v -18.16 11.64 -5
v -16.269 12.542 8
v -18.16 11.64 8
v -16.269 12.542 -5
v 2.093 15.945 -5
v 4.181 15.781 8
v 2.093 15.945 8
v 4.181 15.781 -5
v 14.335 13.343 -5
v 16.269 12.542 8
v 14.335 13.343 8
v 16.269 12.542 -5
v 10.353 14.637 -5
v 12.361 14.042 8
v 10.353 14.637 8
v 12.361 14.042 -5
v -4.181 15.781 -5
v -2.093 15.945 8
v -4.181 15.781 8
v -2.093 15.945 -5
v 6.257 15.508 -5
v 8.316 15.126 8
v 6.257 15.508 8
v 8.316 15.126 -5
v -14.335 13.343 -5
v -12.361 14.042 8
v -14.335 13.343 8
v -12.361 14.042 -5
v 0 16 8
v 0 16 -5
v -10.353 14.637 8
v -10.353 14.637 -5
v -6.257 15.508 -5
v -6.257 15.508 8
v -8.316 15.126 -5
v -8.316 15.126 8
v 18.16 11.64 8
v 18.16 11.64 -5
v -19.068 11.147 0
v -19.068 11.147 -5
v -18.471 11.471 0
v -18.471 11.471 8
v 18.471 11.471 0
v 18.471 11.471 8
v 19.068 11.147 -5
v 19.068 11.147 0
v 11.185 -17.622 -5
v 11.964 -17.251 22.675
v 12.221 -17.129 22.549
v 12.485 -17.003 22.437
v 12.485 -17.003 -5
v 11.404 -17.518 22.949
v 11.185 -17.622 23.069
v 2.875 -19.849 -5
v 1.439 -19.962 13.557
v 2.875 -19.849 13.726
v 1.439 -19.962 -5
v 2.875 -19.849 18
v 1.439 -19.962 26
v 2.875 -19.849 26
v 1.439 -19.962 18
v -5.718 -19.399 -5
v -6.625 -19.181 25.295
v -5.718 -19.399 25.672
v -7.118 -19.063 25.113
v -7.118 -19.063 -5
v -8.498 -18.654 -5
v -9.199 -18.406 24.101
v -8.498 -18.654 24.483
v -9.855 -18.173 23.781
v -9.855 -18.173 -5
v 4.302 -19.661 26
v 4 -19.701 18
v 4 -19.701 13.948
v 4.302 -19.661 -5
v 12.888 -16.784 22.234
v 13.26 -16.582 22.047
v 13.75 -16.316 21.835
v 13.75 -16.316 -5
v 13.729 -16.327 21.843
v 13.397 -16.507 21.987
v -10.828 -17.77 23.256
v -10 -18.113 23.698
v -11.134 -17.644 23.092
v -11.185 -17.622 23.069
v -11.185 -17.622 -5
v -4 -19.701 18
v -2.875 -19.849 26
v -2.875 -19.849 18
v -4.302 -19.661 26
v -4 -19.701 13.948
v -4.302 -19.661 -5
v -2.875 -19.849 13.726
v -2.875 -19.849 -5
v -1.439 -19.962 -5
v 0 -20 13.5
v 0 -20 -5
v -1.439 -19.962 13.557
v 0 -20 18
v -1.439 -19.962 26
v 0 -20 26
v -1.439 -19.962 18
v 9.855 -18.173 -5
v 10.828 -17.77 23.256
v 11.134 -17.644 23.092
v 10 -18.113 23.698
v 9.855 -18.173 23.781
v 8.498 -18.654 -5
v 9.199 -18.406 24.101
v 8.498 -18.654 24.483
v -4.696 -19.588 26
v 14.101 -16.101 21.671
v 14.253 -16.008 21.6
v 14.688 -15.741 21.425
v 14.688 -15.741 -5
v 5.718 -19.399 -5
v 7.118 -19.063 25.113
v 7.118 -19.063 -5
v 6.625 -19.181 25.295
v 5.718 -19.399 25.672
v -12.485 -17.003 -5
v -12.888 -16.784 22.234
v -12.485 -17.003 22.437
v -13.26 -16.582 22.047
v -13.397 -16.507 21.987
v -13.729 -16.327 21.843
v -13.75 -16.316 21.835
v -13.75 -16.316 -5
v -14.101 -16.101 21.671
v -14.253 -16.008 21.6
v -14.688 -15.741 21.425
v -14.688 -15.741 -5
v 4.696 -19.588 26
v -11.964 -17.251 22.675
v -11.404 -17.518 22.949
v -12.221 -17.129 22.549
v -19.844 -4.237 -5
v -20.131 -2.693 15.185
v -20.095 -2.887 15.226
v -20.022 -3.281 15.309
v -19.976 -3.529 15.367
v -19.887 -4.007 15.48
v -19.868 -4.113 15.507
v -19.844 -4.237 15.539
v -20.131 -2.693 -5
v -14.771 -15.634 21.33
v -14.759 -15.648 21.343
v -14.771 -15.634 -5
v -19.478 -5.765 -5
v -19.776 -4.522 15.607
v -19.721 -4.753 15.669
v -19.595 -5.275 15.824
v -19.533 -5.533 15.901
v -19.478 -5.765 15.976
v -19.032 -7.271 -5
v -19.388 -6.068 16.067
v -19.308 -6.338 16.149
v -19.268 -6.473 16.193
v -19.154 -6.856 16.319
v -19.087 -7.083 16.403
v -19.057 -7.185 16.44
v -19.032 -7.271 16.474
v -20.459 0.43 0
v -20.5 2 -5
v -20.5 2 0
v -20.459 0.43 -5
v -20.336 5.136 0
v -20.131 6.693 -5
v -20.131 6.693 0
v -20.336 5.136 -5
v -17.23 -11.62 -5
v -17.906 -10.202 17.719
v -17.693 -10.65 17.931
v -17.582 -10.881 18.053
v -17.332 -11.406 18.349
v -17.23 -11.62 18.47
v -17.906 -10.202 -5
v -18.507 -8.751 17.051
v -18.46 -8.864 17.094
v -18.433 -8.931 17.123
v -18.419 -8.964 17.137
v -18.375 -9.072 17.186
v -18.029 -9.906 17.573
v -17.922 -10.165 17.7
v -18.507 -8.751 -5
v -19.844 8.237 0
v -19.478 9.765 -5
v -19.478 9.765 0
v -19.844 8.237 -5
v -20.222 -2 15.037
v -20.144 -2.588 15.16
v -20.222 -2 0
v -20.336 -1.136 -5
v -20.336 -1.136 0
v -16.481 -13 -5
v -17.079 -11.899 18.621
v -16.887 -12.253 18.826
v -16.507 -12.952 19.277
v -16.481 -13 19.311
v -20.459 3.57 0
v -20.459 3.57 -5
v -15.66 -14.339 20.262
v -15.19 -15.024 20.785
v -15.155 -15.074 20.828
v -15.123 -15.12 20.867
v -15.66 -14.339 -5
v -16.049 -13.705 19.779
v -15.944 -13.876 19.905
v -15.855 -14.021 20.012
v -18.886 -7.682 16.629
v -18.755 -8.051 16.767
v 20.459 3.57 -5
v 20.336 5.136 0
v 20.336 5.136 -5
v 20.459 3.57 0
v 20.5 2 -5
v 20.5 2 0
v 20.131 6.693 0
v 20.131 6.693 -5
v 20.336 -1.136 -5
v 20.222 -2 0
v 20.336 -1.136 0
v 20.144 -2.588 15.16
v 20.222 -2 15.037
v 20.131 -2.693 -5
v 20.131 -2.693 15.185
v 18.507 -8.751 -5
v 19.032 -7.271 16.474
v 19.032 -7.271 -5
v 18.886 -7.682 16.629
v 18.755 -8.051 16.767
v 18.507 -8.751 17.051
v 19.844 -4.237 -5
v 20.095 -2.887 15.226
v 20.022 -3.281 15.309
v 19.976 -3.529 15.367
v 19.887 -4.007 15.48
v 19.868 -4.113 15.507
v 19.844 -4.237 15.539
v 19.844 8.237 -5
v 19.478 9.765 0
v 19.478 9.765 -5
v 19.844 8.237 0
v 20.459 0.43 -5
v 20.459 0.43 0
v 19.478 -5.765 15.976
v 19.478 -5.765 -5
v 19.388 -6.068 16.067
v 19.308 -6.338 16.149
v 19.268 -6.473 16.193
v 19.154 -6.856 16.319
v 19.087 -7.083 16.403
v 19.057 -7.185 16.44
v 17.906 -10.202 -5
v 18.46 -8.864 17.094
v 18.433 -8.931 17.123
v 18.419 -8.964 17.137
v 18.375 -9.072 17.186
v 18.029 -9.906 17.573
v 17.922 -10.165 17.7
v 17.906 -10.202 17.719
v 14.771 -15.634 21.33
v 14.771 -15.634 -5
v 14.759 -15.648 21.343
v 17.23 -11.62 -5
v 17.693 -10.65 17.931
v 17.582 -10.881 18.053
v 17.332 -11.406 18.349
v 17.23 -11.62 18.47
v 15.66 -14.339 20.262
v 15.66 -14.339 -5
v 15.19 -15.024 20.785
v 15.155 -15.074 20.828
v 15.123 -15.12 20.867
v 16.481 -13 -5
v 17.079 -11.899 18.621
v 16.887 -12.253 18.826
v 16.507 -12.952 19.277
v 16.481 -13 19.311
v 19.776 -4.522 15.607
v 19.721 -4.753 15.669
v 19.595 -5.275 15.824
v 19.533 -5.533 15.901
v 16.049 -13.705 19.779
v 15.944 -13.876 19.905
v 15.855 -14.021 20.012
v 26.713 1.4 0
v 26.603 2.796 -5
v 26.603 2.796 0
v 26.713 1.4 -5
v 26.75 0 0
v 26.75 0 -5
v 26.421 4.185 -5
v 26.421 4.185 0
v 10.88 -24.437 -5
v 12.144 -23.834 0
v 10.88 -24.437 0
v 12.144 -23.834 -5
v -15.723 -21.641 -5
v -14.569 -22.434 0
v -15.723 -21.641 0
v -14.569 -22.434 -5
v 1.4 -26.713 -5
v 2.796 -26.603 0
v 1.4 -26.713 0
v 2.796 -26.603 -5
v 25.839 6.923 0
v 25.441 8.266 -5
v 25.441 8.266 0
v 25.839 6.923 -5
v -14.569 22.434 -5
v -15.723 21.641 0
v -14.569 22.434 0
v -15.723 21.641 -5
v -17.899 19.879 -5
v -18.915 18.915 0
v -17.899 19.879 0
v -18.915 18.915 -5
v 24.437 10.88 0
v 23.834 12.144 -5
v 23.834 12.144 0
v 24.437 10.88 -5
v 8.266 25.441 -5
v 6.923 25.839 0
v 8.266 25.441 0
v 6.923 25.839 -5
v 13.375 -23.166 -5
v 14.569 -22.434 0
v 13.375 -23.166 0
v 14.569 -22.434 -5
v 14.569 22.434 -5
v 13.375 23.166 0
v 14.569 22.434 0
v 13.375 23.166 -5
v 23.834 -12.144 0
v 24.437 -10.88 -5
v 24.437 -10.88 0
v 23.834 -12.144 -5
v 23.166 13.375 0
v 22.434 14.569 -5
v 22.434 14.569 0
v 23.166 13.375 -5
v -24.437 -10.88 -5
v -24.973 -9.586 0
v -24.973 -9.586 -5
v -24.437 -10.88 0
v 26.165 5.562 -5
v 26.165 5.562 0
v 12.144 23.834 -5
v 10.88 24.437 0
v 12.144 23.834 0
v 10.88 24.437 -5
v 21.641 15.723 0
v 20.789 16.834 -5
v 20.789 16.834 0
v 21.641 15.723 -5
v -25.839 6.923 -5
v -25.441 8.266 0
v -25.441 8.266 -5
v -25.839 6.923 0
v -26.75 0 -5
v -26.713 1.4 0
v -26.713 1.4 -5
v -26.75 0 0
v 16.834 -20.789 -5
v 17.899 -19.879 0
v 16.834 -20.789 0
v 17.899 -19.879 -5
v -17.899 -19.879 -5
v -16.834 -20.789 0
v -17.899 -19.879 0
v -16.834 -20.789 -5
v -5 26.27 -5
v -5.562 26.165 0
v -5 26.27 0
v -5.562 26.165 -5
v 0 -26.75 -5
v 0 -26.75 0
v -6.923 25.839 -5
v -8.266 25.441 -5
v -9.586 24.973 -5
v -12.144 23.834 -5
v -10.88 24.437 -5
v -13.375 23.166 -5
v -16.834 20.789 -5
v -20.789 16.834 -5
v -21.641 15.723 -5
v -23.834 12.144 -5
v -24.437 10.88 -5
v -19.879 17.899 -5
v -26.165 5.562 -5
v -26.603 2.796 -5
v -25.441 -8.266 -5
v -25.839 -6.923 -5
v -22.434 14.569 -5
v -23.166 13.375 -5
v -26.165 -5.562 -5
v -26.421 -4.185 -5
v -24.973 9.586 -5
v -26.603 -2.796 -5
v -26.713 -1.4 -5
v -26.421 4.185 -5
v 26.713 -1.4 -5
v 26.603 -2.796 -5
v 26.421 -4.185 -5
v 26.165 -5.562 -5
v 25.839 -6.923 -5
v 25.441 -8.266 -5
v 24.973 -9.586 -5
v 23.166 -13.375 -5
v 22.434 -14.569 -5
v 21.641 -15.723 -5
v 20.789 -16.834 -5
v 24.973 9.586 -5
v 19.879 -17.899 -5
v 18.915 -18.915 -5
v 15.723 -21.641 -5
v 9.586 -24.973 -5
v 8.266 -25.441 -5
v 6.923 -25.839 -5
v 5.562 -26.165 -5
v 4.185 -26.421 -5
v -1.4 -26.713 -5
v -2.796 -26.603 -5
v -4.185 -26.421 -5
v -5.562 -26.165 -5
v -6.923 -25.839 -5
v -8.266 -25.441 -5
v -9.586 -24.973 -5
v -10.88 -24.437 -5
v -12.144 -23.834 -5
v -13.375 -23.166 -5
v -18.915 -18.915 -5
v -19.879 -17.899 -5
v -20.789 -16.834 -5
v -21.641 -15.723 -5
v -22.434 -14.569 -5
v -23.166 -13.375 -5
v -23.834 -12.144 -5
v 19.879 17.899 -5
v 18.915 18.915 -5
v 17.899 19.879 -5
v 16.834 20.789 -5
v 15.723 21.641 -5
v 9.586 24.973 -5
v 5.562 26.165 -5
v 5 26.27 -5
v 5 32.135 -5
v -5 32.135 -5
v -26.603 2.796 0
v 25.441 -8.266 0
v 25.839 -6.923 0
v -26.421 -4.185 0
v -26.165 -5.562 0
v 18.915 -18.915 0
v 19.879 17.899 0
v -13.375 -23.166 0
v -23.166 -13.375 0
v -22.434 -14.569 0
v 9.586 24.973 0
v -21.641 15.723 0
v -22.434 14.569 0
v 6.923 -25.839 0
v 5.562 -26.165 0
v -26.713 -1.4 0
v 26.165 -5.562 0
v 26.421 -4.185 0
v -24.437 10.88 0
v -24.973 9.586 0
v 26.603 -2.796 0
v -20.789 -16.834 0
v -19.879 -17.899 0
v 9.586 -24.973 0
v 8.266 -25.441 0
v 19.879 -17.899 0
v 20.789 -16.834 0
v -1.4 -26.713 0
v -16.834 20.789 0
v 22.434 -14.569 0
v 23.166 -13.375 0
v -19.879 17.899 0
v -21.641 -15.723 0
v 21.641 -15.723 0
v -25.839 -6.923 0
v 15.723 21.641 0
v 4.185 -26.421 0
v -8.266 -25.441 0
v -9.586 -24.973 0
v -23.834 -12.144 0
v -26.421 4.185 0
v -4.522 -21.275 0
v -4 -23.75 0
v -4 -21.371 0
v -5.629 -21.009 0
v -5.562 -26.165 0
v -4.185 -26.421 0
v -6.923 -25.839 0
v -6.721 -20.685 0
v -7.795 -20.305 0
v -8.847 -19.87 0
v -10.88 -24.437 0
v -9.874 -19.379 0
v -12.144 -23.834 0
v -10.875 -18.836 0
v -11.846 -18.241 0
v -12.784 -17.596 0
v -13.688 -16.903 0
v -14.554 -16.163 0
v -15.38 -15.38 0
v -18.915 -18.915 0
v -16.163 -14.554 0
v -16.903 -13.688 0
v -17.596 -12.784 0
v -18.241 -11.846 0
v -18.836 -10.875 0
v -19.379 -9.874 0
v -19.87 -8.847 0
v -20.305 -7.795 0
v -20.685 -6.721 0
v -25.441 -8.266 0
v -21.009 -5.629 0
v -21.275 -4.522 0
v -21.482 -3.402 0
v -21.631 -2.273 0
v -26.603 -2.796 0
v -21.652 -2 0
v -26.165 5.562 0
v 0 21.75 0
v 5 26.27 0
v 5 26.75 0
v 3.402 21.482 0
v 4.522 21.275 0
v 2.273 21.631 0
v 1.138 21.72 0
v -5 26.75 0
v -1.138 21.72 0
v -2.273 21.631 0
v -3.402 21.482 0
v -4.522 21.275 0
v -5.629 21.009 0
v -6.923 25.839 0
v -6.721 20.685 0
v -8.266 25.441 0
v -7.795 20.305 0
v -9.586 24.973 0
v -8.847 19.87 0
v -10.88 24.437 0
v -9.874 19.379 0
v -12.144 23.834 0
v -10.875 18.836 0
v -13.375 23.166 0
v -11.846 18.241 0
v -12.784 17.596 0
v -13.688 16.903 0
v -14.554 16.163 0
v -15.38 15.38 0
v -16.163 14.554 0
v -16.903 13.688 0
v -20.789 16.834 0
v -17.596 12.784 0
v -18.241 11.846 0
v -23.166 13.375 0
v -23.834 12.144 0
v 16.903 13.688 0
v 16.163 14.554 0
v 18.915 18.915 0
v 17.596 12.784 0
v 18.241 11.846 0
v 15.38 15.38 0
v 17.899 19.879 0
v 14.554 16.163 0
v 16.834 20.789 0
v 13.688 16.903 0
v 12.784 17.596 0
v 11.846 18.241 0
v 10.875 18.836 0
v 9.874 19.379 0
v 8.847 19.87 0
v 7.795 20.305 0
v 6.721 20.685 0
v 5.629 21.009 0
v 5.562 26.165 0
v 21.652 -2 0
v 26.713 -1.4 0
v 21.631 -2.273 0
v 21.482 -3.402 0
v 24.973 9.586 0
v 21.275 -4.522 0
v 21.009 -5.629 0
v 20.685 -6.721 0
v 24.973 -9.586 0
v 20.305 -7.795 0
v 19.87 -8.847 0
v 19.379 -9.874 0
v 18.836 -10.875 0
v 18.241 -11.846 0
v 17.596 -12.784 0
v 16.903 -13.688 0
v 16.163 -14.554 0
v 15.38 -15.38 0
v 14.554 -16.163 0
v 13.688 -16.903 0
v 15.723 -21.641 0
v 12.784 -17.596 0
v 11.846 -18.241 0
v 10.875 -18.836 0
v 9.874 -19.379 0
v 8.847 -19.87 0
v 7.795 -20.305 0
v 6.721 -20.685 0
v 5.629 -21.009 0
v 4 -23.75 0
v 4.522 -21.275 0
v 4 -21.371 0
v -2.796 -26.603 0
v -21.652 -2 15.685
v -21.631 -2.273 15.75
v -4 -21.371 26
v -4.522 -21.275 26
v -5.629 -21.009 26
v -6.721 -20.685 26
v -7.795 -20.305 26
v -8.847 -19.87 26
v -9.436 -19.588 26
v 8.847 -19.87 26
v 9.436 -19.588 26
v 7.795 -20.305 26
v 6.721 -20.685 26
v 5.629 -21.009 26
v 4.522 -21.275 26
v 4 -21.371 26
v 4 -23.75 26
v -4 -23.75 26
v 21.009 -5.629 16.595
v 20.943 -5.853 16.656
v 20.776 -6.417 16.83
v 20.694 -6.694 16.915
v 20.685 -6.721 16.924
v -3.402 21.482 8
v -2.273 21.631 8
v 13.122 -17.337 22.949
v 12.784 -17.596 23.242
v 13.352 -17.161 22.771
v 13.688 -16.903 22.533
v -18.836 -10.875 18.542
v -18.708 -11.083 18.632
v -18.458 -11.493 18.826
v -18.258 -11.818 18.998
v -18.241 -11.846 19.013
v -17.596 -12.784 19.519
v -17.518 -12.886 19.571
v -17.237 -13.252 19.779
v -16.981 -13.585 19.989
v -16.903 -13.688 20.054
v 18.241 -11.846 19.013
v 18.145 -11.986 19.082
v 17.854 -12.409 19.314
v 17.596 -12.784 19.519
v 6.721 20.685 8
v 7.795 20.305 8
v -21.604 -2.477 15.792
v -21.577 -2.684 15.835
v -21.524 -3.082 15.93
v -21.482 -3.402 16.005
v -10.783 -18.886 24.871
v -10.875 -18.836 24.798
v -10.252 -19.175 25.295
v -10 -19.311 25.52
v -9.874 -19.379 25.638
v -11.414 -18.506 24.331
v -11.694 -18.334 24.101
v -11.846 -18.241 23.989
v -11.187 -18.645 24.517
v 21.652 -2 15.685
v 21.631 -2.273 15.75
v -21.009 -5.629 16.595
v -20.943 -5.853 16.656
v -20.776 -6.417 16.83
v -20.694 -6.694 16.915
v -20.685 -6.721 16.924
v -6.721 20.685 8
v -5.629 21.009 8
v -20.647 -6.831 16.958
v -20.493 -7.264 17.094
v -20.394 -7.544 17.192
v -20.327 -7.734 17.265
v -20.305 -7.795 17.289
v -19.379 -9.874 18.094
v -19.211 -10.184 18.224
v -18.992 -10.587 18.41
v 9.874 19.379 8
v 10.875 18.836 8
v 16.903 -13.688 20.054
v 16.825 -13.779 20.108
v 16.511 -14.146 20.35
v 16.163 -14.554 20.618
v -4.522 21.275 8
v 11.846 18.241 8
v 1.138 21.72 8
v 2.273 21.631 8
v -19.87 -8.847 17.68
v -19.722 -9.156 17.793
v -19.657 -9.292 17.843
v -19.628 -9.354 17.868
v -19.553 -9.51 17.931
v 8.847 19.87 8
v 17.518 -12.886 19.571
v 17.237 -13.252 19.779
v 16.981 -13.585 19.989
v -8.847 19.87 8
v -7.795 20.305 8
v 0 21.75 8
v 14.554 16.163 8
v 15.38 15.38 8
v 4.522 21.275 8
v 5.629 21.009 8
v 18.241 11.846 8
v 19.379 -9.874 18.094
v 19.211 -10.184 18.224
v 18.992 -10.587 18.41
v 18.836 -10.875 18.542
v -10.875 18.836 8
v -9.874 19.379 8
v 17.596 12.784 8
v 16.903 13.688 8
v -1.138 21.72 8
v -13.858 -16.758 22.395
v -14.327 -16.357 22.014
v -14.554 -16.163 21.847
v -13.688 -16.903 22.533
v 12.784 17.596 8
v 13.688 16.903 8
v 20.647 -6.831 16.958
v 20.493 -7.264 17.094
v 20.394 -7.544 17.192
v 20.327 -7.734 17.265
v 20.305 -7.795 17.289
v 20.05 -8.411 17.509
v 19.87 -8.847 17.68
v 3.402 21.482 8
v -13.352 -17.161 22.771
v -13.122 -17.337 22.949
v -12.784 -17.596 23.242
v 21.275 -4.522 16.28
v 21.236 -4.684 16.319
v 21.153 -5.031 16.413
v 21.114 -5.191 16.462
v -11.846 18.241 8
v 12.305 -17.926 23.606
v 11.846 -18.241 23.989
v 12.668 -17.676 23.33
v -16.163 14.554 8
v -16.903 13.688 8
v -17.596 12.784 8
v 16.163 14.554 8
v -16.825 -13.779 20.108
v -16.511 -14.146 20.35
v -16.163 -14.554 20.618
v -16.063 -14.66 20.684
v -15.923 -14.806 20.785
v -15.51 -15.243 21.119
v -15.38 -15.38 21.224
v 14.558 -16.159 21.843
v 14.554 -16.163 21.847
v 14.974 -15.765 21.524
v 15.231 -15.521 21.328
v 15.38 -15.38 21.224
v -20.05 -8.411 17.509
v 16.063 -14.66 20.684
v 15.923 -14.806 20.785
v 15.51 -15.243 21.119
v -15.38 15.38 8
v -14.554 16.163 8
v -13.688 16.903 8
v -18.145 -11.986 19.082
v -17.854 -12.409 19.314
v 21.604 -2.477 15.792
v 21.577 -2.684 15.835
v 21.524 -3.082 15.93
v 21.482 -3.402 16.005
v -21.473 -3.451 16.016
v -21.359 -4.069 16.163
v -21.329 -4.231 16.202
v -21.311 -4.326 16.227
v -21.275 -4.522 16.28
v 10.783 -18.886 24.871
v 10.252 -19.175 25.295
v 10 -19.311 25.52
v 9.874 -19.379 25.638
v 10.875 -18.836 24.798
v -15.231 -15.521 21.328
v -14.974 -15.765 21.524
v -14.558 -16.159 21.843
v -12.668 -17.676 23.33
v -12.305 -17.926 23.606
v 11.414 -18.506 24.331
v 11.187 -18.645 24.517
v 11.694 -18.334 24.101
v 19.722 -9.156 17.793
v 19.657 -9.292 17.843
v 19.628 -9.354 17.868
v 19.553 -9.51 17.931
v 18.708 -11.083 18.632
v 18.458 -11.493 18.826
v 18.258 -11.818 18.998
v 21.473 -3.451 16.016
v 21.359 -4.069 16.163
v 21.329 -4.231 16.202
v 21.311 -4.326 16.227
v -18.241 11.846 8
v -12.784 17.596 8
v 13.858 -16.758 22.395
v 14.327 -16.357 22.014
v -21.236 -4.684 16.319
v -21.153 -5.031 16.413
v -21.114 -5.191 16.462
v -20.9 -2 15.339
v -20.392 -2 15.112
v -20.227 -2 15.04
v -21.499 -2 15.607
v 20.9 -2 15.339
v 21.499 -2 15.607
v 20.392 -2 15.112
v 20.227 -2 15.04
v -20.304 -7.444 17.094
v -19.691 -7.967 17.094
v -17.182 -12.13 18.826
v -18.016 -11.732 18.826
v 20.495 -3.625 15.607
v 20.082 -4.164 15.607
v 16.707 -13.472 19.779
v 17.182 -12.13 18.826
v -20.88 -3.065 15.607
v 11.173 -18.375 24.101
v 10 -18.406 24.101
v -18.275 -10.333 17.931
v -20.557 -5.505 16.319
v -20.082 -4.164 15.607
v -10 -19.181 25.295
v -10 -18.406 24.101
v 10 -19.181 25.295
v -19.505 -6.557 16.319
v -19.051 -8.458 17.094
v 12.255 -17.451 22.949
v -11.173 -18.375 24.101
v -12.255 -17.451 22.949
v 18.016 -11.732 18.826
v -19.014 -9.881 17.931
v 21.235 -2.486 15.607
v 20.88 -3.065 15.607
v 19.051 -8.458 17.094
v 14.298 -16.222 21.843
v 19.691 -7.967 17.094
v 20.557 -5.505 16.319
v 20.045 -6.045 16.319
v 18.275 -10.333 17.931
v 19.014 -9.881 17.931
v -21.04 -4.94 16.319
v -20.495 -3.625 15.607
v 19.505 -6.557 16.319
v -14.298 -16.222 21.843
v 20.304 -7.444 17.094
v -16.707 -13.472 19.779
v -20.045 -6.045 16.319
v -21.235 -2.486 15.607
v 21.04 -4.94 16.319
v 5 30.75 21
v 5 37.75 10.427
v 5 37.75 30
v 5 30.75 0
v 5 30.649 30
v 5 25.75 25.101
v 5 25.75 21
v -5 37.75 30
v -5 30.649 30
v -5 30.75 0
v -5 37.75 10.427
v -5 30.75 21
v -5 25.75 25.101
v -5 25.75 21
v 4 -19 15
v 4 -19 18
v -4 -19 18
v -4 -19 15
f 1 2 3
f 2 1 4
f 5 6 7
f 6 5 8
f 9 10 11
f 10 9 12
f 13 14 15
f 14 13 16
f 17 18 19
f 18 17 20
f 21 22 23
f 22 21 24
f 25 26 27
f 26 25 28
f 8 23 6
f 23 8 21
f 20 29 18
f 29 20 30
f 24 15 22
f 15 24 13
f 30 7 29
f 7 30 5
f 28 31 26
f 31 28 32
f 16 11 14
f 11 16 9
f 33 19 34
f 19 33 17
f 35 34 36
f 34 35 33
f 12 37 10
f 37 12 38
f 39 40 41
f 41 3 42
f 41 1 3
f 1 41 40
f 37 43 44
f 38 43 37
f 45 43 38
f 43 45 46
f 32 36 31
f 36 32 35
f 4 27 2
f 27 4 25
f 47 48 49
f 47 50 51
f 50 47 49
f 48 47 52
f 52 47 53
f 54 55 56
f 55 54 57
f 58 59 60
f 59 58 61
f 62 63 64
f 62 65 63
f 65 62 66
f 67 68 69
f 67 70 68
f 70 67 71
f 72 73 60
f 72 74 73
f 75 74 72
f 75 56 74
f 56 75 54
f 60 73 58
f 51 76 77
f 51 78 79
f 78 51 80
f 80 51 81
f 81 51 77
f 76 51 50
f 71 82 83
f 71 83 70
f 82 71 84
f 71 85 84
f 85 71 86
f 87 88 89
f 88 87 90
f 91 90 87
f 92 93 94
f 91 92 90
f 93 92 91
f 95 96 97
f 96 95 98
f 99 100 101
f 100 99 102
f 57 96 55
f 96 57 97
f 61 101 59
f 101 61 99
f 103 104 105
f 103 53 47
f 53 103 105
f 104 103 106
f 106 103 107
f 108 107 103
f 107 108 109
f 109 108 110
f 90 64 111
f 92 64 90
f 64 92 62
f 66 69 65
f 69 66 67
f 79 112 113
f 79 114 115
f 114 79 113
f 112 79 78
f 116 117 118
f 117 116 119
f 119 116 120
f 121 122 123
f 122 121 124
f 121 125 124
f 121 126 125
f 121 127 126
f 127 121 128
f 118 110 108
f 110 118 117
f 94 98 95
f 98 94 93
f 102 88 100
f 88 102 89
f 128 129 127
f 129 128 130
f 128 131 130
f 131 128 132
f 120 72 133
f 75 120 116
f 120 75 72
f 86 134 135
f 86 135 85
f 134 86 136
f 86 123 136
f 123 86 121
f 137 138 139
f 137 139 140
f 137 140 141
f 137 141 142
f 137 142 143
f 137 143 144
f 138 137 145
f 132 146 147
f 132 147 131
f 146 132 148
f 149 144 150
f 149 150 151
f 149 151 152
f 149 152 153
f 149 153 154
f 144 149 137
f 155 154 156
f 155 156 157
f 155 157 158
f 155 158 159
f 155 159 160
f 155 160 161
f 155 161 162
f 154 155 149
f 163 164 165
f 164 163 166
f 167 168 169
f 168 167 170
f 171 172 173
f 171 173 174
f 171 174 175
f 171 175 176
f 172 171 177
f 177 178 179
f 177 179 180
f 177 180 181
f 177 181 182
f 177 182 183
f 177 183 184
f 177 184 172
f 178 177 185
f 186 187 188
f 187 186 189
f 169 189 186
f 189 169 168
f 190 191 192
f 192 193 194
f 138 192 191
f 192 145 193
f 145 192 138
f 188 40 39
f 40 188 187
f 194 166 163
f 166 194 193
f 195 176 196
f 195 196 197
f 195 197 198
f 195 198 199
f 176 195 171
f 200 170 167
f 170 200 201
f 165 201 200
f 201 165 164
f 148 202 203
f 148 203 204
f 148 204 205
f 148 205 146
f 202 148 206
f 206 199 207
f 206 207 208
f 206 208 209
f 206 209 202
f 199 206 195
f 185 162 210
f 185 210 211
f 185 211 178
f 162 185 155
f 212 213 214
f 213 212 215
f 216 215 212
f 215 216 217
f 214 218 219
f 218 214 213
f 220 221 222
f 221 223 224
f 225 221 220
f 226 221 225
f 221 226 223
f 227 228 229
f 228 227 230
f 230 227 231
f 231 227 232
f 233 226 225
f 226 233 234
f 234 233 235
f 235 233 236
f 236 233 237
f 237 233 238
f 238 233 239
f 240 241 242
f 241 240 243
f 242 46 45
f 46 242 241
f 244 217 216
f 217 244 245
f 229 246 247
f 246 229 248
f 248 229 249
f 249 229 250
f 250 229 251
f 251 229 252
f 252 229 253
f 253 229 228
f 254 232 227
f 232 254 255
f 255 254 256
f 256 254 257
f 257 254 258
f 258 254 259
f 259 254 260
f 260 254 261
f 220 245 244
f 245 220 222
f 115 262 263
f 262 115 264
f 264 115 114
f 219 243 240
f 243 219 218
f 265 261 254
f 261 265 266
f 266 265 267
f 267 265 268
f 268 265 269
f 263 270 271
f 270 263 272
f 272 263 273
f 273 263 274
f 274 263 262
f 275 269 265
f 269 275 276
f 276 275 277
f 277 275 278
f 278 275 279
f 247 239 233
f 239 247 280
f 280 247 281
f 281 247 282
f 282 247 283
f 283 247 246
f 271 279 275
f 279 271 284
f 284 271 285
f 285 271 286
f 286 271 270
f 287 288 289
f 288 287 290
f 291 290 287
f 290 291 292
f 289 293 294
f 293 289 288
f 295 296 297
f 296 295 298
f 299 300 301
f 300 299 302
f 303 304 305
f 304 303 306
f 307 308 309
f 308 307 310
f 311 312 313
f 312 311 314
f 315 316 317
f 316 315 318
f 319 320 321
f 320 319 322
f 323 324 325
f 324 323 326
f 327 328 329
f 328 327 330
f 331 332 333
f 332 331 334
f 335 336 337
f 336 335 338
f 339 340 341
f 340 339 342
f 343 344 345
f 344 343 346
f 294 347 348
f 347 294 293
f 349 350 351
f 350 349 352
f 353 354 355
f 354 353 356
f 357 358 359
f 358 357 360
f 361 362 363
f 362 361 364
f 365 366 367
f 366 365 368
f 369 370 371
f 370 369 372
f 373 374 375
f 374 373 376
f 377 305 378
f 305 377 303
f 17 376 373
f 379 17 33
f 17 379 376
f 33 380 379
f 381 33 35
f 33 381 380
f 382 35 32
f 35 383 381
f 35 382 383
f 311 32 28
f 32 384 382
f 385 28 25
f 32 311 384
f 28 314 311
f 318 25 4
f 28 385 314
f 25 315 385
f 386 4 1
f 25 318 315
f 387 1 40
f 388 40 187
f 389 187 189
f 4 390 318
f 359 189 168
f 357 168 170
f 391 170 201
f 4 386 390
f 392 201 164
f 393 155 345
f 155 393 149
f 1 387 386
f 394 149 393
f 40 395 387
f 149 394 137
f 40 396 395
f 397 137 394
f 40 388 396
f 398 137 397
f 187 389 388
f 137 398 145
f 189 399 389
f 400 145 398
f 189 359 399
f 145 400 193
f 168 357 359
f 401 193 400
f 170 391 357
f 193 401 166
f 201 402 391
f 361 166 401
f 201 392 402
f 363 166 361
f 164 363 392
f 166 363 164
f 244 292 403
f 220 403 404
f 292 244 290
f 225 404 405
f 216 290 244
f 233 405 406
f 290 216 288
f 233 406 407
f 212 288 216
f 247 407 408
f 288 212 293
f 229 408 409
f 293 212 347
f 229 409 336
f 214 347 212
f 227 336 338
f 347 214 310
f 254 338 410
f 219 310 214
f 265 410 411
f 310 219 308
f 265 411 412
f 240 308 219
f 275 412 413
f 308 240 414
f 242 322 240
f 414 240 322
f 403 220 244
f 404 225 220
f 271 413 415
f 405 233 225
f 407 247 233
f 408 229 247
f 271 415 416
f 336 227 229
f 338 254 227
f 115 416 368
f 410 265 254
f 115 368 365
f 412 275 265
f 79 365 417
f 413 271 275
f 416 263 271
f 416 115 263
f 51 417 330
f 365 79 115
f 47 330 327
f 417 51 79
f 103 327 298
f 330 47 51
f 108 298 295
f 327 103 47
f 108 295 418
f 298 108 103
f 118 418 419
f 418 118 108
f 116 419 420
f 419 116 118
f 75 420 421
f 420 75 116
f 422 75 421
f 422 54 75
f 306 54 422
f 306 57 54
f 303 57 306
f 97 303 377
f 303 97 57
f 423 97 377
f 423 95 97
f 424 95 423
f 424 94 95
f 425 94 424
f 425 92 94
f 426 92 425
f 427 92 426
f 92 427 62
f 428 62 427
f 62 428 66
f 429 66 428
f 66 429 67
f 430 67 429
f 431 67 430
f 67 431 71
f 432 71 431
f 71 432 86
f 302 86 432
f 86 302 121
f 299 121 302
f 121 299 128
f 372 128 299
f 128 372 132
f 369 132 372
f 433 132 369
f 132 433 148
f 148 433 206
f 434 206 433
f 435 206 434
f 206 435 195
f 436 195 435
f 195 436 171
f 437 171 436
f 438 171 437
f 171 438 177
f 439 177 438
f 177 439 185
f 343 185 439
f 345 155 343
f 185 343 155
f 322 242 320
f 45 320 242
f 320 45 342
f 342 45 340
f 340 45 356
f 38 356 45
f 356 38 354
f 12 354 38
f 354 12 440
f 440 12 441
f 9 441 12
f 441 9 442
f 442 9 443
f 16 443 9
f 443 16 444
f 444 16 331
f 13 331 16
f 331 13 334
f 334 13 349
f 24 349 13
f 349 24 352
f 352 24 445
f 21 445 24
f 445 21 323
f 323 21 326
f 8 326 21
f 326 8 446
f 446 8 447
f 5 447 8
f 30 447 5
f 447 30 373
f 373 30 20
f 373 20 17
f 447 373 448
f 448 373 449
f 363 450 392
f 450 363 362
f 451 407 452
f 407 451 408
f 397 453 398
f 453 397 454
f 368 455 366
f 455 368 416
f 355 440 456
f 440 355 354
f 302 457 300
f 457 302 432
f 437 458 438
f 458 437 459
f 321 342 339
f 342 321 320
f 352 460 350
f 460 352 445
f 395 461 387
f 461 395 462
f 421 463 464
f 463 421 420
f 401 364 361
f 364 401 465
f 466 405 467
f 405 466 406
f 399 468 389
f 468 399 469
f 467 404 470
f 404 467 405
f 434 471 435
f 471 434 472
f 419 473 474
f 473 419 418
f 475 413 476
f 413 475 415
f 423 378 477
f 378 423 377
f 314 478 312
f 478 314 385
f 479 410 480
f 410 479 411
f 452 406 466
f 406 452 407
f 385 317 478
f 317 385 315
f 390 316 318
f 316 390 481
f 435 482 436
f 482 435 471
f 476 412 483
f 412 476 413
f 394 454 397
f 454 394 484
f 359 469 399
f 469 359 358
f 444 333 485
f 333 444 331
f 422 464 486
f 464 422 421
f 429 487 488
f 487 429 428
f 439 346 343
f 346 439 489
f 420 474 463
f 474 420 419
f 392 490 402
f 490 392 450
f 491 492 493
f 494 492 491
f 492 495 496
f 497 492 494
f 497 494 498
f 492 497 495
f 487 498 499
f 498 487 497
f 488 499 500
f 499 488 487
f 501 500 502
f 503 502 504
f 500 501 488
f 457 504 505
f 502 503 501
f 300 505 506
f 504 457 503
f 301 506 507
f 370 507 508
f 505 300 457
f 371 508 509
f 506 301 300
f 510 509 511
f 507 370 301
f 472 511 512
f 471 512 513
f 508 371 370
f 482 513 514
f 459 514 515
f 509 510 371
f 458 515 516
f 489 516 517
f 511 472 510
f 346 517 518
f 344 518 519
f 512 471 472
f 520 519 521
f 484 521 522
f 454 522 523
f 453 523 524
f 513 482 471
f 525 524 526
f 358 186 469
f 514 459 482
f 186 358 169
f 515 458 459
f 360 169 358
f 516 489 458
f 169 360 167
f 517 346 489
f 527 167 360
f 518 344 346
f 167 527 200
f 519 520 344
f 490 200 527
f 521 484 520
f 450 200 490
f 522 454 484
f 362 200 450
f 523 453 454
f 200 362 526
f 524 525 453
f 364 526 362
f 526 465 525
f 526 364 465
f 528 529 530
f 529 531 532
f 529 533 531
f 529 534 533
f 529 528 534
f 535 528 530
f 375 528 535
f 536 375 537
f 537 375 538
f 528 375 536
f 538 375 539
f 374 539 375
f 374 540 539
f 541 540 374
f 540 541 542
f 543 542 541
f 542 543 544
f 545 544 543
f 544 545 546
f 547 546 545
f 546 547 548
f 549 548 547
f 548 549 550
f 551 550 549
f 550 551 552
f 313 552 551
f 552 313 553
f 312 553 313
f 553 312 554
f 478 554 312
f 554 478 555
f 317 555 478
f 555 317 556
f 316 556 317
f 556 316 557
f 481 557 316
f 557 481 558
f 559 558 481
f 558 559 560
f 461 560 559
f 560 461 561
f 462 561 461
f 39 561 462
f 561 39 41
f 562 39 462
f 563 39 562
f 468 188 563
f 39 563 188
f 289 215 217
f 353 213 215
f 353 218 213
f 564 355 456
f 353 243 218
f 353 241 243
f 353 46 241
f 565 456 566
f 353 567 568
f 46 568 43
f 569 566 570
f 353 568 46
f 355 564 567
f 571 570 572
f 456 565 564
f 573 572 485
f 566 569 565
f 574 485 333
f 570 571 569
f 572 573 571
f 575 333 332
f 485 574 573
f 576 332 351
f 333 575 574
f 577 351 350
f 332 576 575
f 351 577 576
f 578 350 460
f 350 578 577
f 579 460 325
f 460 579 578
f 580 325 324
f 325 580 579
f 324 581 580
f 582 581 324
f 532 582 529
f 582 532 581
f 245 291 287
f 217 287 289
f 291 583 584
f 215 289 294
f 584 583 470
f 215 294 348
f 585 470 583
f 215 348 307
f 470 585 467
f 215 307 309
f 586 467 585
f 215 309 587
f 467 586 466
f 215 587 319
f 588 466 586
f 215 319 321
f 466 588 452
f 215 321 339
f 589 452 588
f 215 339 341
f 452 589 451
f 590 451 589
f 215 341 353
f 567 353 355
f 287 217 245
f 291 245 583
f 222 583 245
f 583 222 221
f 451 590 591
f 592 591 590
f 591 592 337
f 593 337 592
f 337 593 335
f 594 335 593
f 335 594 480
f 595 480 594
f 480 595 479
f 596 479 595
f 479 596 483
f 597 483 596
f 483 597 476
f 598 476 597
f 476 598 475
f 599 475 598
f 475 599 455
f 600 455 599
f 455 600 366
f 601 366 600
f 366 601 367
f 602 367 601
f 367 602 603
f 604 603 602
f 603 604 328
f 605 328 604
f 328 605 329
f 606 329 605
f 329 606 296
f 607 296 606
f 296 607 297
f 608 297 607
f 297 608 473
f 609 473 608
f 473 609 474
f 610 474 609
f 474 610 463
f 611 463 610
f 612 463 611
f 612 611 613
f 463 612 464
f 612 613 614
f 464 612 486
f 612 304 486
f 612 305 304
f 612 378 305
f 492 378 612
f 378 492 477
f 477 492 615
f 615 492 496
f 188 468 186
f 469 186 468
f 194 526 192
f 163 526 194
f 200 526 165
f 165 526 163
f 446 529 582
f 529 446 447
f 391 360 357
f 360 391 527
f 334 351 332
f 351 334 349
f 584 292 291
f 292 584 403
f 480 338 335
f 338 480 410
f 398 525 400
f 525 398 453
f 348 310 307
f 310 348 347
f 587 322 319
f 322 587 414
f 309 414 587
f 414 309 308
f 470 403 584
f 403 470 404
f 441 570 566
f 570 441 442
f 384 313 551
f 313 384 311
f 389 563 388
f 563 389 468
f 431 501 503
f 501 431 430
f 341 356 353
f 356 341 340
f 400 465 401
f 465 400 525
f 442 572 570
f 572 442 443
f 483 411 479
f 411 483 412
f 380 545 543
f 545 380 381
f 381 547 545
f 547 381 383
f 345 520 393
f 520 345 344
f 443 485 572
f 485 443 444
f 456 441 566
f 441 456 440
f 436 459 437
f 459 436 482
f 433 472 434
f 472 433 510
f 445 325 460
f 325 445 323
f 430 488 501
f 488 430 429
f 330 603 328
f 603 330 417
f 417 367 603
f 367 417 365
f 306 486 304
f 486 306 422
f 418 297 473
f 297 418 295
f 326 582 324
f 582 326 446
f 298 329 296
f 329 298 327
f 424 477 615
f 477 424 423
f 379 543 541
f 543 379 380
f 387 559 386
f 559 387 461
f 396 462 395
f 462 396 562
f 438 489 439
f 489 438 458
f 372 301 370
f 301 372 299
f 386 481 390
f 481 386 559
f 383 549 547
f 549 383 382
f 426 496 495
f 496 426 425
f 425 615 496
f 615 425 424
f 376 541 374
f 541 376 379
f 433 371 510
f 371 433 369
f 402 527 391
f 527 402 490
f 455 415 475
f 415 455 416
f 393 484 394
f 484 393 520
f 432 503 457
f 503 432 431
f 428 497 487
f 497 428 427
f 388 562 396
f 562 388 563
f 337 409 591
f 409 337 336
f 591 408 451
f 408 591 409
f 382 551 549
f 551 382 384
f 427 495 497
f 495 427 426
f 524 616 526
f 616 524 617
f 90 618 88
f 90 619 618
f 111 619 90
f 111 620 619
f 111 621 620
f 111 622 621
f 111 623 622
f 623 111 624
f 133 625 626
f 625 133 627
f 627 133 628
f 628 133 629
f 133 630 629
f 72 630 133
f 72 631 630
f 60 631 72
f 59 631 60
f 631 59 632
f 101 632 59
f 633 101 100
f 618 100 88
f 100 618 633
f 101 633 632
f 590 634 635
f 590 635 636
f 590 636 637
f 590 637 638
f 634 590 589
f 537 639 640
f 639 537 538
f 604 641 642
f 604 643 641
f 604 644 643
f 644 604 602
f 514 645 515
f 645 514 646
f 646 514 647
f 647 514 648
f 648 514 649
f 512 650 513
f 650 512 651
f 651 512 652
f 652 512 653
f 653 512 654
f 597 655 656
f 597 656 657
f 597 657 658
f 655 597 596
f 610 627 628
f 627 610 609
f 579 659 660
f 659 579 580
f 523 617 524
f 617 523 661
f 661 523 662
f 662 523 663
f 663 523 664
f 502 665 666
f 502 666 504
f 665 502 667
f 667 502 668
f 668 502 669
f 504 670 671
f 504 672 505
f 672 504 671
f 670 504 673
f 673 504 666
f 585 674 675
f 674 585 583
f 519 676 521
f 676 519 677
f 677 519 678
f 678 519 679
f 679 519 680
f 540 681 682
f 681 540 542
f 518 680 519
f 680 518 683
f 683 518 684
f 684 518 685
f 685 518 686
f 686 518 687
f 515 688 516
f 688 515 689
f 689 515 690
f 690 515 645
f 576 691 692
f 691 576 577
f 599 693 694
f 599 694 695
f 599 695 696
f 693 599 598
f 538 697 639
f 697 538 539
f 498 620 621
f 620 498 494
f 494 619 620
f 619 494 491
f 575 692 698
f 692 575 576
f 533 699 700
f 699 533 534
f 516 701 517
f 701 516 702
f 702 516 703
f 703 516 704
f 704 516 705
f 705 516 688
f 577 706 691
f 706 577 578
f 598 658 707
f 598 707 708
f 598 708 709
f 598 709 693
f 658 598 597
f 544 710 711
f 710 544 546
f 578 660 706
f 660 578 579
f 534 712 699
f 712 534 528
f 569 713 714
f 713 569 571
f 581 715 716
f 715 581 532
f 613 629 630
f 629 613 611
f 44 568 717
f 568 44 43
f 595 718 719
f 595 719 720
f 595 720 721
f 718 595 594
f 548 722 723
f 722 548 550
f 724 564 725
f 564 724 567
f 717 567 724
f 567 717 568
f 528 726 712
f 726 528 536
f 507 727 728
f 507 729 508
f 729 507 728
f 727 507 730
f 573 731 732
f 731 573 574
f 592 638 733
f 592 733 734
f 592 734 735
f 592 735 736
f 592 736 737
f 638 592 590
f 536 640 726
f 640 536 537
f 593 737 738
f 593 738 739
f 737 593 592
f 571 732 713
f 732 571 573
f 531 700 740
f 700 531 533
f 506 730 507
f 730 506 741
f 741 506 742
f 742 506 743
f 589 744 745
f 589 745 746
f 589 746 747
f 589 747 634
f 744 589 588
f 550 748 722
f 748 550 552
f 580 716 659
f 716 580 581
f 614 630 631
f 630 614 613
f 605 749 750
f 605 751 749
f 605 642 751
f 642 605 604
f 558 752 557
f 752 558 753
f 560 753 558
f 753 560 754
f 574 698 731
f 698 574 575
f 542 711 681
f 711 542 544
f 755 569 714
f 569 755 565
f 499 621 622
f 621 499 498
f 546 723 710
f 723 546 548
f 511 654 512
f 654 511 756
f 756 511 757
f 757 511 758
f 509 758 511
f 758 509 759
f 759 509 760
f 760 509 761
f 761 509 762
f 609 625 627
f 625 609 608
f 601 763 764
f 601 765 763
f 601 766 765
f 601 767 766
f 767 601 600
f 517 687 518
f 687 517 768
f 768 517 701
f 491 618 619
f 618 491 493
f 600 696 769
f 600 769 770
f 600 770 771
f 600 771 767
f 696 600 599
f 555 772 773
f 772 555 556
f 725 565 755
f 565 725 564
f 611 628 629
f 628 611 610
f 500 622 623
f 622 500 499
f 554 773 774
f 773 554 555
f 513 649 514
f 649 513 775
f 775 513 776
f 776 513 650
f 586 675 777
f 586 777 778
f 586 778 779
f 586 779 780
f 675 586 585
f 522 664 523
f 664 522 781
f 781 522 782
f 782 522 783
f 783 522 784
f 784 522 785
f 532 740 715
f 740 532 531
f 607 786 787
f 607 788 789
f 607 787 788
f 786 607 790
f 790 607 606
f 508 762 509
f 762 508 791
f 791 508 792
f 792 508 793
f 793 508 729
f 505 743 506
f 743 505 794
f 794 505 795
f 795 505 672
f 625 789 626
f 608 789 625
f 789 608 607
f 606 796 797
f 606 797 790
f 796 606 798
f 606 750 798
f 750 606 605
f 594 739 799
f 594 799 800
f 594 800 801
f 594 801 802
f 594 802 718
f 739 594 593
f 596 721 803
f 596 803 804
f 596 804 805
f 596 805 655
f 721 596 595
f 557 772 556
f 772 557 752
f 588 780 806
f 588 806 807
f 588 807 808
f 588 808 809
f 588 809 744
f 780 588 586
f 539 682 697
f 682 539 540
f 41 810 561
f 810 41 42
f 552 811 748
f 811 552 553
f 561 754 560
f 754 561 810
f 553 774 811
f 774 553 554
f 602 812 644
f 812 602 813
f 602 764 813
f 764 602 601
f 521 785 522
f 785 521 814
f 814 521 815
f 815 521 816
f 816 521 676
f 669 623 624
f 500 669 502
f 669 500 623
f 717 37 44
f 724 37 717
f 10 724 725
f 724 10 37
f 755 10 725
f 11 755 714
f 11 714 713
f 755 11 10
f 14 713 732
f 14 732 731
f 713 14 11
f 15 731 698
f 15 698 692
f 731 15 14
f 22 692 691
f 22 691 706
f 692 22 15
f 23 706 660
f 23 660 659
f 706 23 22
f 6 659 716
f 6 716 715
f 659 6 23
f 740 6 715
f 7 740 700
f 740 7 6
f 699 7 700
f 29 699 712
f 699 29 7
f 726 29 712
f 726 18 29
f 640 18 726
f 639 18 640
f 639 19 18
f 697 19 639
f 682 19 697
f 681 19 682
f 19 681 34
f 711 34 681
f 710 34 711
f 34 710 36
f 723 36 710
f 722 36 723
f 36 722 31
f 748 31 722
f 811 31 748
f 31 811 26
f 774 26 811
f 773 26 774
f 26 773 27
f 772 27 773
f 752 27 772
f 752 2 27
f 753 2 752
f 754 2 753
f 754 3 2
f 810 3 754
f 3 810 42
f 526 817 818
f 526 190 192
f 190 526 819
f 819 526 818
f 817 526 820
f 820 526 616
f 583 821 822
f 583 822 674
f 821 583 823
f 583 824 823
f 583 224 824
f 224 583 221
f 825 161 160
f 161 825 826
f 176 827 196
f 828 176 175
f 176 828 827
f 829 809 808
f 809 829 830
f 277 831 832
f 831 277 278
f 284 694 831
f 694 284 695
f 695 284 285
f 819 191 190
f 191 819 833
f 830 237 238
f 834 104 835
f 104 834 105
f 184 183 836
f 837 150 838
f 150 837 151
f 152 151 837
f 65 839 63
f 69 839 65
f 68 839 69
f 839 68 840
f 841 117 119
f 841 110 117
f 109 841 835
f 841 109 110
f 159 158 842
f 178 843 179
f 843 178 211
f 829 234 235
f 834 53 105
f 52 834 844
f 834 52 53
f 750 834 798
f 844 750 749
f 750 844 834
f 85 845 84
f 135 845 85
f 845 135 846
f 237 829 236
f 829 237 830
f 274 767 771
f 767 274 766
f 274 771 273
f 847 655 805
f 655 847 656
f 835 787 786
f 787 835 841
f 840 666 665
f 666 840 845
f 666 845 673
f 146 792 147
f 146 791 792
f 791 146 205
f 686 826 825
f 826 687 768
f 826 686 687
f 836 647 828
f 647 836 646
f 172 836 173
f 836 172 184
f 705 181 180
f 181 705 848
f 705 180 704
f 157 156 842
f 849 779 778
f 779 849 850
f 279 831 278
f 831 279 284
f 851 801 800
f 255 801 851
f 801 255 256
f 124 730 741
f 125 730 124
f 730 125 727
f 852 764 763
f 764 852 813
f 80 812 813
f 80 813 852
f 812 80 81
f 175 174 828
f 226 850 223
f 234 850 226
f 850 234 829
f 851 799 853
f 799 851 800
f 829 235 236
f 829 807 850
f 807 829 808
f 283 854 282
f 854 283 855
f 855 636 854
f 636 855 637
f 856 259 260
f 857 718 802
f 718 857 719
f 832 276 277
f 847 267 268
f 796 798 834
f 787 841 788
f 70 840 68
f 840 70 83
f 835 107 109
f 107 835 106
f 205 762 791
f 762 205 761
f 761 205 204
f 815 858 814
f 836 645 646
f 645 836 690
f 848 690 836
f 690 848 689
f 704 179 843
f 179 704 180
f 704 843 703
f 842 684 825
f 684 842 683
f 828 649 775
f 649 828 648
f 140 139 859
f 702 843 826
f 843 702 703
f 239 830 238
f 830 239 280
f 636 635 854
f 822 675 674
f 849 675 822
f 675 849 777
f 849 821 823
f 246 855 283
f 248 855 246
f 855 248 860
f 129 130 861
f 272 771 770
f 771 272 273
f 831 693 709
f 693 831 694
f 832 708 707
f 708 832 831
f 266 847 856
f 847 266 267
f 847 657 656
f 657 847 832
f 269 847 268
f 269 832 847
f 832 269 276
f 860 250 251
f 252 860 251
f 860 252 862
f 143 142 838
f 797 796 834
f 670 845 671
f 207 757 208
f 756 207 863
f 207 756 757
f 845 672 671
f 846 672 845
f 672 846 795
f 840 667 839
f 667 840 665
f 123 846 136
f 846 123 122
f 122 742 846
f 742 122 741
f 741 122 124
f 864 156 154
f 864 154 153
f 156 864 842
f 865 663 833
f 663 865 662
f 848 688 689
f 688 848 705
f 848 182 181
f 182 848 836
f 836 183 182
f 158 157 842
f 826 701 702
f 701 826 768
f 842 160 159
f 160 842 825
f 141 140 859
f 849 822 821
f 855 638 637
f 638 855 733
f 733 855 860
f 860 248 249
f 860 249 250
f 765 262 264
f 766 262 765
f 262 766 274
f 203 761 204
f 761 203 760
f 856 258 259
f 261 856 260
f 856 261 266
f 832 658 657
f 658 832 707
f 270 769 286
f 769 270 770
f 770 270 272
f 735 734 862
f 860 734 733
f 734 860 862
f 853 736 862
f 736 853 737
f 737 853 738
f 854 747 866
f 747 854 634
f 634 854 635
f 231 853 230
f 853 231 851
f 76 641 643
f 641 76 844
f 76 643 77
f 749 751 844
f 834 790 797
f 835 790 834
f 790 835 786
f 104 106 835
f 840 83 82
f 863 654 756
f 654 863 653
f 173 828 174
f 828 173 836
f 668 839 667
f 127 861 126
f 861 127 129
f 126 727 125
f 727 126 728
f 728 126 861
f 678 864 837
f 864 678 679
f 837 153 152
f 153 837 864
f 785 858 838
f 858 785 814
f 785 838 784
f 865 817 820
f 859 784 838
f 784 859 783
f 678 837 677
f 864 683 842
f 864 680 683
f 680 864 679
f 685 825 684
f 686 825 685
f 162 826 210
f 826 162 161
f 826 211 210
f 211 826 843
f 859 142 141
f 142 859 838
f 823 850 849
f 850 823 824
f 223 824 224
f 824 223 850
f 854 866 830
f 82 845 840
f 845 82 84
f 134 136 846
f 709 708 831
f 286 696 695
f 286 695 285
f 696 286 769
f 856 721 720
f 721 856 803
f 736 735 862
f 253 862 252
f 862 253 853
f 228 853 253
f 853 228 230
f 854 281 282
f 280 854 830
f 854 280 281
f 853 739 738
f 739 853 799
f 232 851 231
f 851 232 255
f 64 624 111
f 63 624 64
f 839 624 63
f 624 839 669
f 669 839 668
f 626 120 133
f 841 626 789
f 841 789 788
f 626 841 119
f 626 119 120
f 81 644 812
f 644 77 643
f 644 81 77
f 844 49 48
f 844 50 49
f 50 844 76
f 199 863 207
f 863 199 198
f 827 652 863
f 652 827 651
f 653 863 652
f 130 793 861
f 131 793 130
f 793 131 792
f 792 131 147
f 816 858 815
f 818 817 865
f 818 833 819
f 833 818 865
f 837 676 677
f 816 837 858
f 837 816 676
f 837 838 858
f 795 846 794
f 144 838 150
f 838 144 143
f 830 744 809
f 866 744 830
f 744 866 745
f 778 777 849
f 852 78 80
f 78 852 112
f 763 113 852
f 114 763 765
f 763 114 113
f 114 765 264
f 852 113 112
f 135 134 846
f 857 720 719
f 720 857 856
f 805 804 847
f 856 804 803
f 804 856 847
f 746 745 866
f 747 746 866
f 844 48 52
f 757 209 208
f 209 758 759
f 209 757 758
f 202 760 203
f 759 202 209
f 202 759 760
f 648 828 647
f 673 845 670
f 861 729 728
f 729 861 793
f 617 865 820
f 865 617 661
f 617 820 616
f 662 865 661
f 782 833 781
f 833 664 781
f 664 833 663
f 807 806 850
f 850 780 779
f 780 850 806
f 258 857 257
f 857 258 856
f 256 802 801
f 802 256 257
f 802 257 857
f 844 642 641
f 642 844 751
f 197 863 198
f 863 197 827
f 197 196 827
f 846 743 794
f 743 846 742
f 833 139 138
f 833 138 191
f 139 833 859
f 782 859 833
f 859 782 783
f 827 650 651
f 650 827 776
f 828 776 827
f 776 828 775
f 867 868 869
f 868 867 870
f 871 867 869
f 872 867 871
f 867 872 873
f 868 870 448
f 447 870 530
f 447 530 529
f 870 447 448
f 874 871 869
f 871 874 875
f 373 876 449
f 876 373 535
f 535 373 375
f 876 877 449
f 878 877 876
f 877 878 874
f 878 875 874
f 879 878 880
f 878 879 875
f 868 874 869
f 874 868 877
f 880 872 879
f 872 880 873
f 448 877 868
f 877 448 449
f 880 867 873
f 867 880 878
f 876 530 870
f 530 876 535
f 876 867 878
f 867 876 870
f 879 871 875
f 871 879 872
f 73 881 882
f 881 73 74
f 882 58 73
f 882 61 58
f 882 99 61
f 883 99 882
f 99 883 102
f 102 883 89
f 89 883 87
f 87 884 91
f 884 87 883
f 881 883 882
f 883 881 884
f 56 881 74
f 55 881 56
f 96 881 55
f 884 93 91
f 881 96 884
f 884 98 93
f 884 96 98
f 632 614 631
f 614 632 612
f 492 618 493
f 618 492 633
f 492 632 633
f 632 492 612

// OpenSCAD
// J1772-to-Tesla mounting bracket adapter
// Copyright (c) 2019 by Rod Smith
// Licensed under the terms of the GNU GPL, v.2

// This Thing is designed to mount in a J1772 mounting holster,
// converting it for use with a Tesla charging cable or a J1772
// cable with a Tesla J1772 charging adapter connected.
// This should help simplify a switch from a non-Tesla EV or
// PHEV to a Tesla, or use of a non-Tesla EVSE if you simply
// prefer one to Tesla's own Wall Connector.
//
// I've tested this design with the Clipper Creek J1772 holster
// and with a generic one I happened to have on hand. I cannot
// guarantee that it will work with anything else; you may need
// to adjust some parameters....

//
// Global parameters....
//

// Segments per circle....
$fn=120;

// Position of tab for latching onto Tesla plug or adapter
teslaTabHeight = 20;

// Maximum height of the inner ring
ringHeight = 26;

// Diameter of the inner ring; should not normally be changed
ringDiameter = 43.5;

// Height of the outer base
baseHeight = 5;

// Extra radius for base
baseWidth = 10;

//
// Support functions....
//

// Create a hole for the Tesla plug....
module TeslaPlugShape(tHeight=22) {
    sideOffsetX = 9.5;
    sideOffsetY = 2;
    sideCylinderD = 60;
//    hull() {
//        translate([-20, 16, 0]) cylinder(d=3, h=tHeight);
//        translate([20, 16, 0]) cylinder(d=3, h=tHeight);
//        translate([0, 17, 0]) cylinder(d=3, h=tHeight);
//        translate([-18, -16, 0]) cylinder(d=3, h=tHeight);
//        translate([18, -16, 0]) cylinder(d=3, h=tHeight);
//        translate([0, -20, 0]) cylinder(d=3, h=tHeight);
//    }
    intersection() {
        // Top part....
        translate([0, -24, 0]) cylinder(d=80, h=tHeight);
        // Bottom part....
        translate([0, 7.5, 0]) cylinder(d=55, h=tHeight);
        // Side parts....
        translate([sideOffsetX, sideOffsetY, 0])
            cylinder(d=sideCylinderD, h=tHeight);
        translate([-sideOffsetX, sideOffsetY, 0])
            cylinder(d=sideCylinderD, h=tHeight);
    }
} // module TeslaPlugShape()
//
//// Create a hole for the Tesla plug....
//module TeslaPlugShape(tHeight=22) {
//    sideOffsetX = -1;
//    sideOffsetY = -0;
//    sideCylinderD = 44;
//    intersection() {
//        // Top part....
//        translate([0, -23, 0]) cylinder(d=80, h=tHeight);
//        // Bottom part....
//        translate([0, 1, 0]) cylinder (d=ringDiameter, h=tHeight);
//        // Side parts....
//        translate([sideOffsetX, sideOffsetY, 0])
//            cylinder(d=sideCylinderD, h=tHeight);
//        translate([-sideOffsetX, sideOffsetY, 0])
//            cylinder(d=sideCylinderD, h=tHeight);
//    }
//} // module TeslaPlugShape()

// Create a right-angle wedge with the specified dimensions
module RaWedge(width, depth, height) {
    translate([width, 0, 0]) rotate([90,0,-90]) linear_extrude(width)
        polygon(points=[[0, 0], [0, height], [depth, 0]]);
} // module RaWedge()


//
// Main part components....
//

// Create a wider base. This prevents inserting the adapter
// too deep into the J1772 holster and provides a way to attach
// the clip to the main body of the adapter.
module Base() {
    translate([0, 0, -baseHeight]) difference() {
        cylinder(d=ringDiameter+baseWidth, h=baseHeight);
        translate([0, 0, -1]) TeslaPlugShape(baseHeight+2);
    }
} // module Base()

// Create a framing ring that partially surrounds the Tesla
// connector, which both stabilizes the Tesla connector and
// helps keep the adapter from wobbling in the J1772 holster....
module AdapterRing() {
    difference() {
        cylinder(d=ringDiameter, h=ringHeight);
        translate([0,0,-1]) TeslaPlugShape(ringHeight+2);
        translate([-ringDiameter/2,-2,8])
            cube([ringDiameter, ringDiameter/1.5, ringHeight+2]);
        translate([-ringDiameter/2, -2, 0])
            cube([ringDiameter, 13, ringHeight+2]);
        hull() {
            translate([10,4,ringDiameter-4]) sphere(d=ringDiameter*1.25);
            translate([-10,4,ringDiameter-4]) sphere(d=ringDiameter*1.25);
        }
    } // difference()
} // module AdapterRing()

// Create a tab along the side (bottom of the adapter when in use)
// that helps position the adapter in the J1772 holster....
module PositionTab() {
    translate([-4, -2-ringDiameter/2, -baseHeight])
        cube([8, 2.5, ringHeight+baseHeight]);
} // module PositionTab()

// Create a simple latch to hold the adapter in place....
module J1772Latch() {
    latchHeight = 30 + baseHeight;
    latchWidth = 10;
    latchDepth = 12;
    translate([-latchWidth/2, ringDiameter/2 + 4, -baseHeight]) {
        difference() {
            cube([latchWidth, latchDepth, latchHeight]);
            rotate([-20, 0, 0]) translate([-1, latchDepth/2, 1])
                cube([latchWidth + 2, latchDepth, latchHeight/1.5]);
            translate([-1, -1, baseHeight])
                cube([latchWidth + 2, 6, ringHeight - 5]);
            translate([-1, -5, latchHeight]) rotate([-45, 0, 0]) 
                cube([latchWidth + 2, 7, 9]);
            //#cube([latchWidth+2, latchDepth, latchHeight]);
        } // difference()
        translate([0, -8, 0]) cube([latchWidth, 9, baseHeight]);
    } // translate()
} // module J1772Latch()

// Create a tab onto which the Tesla plug hooks when it's
// inserted in the adapter....
module TeslaTab() {
    tabX = 8;
    tabY = 2;
    tabZ = 3;
    translate([-tabX/2, -tabY/2, 0]) cube([tabX, tabY, tabZ]);
    translate([-tabX/2, -tabY/2, 0]) rotate([180, 0, 0])
        RaWedge(tabX, tabY, 3);
} // module TeslaTab()


//
// Main body of the design....
//

Base();
AdapterRing();
PositionTab();
J1772Latch();
translate([0, -20, teslaTabHeight - baseHeight]) TeslaTab();
